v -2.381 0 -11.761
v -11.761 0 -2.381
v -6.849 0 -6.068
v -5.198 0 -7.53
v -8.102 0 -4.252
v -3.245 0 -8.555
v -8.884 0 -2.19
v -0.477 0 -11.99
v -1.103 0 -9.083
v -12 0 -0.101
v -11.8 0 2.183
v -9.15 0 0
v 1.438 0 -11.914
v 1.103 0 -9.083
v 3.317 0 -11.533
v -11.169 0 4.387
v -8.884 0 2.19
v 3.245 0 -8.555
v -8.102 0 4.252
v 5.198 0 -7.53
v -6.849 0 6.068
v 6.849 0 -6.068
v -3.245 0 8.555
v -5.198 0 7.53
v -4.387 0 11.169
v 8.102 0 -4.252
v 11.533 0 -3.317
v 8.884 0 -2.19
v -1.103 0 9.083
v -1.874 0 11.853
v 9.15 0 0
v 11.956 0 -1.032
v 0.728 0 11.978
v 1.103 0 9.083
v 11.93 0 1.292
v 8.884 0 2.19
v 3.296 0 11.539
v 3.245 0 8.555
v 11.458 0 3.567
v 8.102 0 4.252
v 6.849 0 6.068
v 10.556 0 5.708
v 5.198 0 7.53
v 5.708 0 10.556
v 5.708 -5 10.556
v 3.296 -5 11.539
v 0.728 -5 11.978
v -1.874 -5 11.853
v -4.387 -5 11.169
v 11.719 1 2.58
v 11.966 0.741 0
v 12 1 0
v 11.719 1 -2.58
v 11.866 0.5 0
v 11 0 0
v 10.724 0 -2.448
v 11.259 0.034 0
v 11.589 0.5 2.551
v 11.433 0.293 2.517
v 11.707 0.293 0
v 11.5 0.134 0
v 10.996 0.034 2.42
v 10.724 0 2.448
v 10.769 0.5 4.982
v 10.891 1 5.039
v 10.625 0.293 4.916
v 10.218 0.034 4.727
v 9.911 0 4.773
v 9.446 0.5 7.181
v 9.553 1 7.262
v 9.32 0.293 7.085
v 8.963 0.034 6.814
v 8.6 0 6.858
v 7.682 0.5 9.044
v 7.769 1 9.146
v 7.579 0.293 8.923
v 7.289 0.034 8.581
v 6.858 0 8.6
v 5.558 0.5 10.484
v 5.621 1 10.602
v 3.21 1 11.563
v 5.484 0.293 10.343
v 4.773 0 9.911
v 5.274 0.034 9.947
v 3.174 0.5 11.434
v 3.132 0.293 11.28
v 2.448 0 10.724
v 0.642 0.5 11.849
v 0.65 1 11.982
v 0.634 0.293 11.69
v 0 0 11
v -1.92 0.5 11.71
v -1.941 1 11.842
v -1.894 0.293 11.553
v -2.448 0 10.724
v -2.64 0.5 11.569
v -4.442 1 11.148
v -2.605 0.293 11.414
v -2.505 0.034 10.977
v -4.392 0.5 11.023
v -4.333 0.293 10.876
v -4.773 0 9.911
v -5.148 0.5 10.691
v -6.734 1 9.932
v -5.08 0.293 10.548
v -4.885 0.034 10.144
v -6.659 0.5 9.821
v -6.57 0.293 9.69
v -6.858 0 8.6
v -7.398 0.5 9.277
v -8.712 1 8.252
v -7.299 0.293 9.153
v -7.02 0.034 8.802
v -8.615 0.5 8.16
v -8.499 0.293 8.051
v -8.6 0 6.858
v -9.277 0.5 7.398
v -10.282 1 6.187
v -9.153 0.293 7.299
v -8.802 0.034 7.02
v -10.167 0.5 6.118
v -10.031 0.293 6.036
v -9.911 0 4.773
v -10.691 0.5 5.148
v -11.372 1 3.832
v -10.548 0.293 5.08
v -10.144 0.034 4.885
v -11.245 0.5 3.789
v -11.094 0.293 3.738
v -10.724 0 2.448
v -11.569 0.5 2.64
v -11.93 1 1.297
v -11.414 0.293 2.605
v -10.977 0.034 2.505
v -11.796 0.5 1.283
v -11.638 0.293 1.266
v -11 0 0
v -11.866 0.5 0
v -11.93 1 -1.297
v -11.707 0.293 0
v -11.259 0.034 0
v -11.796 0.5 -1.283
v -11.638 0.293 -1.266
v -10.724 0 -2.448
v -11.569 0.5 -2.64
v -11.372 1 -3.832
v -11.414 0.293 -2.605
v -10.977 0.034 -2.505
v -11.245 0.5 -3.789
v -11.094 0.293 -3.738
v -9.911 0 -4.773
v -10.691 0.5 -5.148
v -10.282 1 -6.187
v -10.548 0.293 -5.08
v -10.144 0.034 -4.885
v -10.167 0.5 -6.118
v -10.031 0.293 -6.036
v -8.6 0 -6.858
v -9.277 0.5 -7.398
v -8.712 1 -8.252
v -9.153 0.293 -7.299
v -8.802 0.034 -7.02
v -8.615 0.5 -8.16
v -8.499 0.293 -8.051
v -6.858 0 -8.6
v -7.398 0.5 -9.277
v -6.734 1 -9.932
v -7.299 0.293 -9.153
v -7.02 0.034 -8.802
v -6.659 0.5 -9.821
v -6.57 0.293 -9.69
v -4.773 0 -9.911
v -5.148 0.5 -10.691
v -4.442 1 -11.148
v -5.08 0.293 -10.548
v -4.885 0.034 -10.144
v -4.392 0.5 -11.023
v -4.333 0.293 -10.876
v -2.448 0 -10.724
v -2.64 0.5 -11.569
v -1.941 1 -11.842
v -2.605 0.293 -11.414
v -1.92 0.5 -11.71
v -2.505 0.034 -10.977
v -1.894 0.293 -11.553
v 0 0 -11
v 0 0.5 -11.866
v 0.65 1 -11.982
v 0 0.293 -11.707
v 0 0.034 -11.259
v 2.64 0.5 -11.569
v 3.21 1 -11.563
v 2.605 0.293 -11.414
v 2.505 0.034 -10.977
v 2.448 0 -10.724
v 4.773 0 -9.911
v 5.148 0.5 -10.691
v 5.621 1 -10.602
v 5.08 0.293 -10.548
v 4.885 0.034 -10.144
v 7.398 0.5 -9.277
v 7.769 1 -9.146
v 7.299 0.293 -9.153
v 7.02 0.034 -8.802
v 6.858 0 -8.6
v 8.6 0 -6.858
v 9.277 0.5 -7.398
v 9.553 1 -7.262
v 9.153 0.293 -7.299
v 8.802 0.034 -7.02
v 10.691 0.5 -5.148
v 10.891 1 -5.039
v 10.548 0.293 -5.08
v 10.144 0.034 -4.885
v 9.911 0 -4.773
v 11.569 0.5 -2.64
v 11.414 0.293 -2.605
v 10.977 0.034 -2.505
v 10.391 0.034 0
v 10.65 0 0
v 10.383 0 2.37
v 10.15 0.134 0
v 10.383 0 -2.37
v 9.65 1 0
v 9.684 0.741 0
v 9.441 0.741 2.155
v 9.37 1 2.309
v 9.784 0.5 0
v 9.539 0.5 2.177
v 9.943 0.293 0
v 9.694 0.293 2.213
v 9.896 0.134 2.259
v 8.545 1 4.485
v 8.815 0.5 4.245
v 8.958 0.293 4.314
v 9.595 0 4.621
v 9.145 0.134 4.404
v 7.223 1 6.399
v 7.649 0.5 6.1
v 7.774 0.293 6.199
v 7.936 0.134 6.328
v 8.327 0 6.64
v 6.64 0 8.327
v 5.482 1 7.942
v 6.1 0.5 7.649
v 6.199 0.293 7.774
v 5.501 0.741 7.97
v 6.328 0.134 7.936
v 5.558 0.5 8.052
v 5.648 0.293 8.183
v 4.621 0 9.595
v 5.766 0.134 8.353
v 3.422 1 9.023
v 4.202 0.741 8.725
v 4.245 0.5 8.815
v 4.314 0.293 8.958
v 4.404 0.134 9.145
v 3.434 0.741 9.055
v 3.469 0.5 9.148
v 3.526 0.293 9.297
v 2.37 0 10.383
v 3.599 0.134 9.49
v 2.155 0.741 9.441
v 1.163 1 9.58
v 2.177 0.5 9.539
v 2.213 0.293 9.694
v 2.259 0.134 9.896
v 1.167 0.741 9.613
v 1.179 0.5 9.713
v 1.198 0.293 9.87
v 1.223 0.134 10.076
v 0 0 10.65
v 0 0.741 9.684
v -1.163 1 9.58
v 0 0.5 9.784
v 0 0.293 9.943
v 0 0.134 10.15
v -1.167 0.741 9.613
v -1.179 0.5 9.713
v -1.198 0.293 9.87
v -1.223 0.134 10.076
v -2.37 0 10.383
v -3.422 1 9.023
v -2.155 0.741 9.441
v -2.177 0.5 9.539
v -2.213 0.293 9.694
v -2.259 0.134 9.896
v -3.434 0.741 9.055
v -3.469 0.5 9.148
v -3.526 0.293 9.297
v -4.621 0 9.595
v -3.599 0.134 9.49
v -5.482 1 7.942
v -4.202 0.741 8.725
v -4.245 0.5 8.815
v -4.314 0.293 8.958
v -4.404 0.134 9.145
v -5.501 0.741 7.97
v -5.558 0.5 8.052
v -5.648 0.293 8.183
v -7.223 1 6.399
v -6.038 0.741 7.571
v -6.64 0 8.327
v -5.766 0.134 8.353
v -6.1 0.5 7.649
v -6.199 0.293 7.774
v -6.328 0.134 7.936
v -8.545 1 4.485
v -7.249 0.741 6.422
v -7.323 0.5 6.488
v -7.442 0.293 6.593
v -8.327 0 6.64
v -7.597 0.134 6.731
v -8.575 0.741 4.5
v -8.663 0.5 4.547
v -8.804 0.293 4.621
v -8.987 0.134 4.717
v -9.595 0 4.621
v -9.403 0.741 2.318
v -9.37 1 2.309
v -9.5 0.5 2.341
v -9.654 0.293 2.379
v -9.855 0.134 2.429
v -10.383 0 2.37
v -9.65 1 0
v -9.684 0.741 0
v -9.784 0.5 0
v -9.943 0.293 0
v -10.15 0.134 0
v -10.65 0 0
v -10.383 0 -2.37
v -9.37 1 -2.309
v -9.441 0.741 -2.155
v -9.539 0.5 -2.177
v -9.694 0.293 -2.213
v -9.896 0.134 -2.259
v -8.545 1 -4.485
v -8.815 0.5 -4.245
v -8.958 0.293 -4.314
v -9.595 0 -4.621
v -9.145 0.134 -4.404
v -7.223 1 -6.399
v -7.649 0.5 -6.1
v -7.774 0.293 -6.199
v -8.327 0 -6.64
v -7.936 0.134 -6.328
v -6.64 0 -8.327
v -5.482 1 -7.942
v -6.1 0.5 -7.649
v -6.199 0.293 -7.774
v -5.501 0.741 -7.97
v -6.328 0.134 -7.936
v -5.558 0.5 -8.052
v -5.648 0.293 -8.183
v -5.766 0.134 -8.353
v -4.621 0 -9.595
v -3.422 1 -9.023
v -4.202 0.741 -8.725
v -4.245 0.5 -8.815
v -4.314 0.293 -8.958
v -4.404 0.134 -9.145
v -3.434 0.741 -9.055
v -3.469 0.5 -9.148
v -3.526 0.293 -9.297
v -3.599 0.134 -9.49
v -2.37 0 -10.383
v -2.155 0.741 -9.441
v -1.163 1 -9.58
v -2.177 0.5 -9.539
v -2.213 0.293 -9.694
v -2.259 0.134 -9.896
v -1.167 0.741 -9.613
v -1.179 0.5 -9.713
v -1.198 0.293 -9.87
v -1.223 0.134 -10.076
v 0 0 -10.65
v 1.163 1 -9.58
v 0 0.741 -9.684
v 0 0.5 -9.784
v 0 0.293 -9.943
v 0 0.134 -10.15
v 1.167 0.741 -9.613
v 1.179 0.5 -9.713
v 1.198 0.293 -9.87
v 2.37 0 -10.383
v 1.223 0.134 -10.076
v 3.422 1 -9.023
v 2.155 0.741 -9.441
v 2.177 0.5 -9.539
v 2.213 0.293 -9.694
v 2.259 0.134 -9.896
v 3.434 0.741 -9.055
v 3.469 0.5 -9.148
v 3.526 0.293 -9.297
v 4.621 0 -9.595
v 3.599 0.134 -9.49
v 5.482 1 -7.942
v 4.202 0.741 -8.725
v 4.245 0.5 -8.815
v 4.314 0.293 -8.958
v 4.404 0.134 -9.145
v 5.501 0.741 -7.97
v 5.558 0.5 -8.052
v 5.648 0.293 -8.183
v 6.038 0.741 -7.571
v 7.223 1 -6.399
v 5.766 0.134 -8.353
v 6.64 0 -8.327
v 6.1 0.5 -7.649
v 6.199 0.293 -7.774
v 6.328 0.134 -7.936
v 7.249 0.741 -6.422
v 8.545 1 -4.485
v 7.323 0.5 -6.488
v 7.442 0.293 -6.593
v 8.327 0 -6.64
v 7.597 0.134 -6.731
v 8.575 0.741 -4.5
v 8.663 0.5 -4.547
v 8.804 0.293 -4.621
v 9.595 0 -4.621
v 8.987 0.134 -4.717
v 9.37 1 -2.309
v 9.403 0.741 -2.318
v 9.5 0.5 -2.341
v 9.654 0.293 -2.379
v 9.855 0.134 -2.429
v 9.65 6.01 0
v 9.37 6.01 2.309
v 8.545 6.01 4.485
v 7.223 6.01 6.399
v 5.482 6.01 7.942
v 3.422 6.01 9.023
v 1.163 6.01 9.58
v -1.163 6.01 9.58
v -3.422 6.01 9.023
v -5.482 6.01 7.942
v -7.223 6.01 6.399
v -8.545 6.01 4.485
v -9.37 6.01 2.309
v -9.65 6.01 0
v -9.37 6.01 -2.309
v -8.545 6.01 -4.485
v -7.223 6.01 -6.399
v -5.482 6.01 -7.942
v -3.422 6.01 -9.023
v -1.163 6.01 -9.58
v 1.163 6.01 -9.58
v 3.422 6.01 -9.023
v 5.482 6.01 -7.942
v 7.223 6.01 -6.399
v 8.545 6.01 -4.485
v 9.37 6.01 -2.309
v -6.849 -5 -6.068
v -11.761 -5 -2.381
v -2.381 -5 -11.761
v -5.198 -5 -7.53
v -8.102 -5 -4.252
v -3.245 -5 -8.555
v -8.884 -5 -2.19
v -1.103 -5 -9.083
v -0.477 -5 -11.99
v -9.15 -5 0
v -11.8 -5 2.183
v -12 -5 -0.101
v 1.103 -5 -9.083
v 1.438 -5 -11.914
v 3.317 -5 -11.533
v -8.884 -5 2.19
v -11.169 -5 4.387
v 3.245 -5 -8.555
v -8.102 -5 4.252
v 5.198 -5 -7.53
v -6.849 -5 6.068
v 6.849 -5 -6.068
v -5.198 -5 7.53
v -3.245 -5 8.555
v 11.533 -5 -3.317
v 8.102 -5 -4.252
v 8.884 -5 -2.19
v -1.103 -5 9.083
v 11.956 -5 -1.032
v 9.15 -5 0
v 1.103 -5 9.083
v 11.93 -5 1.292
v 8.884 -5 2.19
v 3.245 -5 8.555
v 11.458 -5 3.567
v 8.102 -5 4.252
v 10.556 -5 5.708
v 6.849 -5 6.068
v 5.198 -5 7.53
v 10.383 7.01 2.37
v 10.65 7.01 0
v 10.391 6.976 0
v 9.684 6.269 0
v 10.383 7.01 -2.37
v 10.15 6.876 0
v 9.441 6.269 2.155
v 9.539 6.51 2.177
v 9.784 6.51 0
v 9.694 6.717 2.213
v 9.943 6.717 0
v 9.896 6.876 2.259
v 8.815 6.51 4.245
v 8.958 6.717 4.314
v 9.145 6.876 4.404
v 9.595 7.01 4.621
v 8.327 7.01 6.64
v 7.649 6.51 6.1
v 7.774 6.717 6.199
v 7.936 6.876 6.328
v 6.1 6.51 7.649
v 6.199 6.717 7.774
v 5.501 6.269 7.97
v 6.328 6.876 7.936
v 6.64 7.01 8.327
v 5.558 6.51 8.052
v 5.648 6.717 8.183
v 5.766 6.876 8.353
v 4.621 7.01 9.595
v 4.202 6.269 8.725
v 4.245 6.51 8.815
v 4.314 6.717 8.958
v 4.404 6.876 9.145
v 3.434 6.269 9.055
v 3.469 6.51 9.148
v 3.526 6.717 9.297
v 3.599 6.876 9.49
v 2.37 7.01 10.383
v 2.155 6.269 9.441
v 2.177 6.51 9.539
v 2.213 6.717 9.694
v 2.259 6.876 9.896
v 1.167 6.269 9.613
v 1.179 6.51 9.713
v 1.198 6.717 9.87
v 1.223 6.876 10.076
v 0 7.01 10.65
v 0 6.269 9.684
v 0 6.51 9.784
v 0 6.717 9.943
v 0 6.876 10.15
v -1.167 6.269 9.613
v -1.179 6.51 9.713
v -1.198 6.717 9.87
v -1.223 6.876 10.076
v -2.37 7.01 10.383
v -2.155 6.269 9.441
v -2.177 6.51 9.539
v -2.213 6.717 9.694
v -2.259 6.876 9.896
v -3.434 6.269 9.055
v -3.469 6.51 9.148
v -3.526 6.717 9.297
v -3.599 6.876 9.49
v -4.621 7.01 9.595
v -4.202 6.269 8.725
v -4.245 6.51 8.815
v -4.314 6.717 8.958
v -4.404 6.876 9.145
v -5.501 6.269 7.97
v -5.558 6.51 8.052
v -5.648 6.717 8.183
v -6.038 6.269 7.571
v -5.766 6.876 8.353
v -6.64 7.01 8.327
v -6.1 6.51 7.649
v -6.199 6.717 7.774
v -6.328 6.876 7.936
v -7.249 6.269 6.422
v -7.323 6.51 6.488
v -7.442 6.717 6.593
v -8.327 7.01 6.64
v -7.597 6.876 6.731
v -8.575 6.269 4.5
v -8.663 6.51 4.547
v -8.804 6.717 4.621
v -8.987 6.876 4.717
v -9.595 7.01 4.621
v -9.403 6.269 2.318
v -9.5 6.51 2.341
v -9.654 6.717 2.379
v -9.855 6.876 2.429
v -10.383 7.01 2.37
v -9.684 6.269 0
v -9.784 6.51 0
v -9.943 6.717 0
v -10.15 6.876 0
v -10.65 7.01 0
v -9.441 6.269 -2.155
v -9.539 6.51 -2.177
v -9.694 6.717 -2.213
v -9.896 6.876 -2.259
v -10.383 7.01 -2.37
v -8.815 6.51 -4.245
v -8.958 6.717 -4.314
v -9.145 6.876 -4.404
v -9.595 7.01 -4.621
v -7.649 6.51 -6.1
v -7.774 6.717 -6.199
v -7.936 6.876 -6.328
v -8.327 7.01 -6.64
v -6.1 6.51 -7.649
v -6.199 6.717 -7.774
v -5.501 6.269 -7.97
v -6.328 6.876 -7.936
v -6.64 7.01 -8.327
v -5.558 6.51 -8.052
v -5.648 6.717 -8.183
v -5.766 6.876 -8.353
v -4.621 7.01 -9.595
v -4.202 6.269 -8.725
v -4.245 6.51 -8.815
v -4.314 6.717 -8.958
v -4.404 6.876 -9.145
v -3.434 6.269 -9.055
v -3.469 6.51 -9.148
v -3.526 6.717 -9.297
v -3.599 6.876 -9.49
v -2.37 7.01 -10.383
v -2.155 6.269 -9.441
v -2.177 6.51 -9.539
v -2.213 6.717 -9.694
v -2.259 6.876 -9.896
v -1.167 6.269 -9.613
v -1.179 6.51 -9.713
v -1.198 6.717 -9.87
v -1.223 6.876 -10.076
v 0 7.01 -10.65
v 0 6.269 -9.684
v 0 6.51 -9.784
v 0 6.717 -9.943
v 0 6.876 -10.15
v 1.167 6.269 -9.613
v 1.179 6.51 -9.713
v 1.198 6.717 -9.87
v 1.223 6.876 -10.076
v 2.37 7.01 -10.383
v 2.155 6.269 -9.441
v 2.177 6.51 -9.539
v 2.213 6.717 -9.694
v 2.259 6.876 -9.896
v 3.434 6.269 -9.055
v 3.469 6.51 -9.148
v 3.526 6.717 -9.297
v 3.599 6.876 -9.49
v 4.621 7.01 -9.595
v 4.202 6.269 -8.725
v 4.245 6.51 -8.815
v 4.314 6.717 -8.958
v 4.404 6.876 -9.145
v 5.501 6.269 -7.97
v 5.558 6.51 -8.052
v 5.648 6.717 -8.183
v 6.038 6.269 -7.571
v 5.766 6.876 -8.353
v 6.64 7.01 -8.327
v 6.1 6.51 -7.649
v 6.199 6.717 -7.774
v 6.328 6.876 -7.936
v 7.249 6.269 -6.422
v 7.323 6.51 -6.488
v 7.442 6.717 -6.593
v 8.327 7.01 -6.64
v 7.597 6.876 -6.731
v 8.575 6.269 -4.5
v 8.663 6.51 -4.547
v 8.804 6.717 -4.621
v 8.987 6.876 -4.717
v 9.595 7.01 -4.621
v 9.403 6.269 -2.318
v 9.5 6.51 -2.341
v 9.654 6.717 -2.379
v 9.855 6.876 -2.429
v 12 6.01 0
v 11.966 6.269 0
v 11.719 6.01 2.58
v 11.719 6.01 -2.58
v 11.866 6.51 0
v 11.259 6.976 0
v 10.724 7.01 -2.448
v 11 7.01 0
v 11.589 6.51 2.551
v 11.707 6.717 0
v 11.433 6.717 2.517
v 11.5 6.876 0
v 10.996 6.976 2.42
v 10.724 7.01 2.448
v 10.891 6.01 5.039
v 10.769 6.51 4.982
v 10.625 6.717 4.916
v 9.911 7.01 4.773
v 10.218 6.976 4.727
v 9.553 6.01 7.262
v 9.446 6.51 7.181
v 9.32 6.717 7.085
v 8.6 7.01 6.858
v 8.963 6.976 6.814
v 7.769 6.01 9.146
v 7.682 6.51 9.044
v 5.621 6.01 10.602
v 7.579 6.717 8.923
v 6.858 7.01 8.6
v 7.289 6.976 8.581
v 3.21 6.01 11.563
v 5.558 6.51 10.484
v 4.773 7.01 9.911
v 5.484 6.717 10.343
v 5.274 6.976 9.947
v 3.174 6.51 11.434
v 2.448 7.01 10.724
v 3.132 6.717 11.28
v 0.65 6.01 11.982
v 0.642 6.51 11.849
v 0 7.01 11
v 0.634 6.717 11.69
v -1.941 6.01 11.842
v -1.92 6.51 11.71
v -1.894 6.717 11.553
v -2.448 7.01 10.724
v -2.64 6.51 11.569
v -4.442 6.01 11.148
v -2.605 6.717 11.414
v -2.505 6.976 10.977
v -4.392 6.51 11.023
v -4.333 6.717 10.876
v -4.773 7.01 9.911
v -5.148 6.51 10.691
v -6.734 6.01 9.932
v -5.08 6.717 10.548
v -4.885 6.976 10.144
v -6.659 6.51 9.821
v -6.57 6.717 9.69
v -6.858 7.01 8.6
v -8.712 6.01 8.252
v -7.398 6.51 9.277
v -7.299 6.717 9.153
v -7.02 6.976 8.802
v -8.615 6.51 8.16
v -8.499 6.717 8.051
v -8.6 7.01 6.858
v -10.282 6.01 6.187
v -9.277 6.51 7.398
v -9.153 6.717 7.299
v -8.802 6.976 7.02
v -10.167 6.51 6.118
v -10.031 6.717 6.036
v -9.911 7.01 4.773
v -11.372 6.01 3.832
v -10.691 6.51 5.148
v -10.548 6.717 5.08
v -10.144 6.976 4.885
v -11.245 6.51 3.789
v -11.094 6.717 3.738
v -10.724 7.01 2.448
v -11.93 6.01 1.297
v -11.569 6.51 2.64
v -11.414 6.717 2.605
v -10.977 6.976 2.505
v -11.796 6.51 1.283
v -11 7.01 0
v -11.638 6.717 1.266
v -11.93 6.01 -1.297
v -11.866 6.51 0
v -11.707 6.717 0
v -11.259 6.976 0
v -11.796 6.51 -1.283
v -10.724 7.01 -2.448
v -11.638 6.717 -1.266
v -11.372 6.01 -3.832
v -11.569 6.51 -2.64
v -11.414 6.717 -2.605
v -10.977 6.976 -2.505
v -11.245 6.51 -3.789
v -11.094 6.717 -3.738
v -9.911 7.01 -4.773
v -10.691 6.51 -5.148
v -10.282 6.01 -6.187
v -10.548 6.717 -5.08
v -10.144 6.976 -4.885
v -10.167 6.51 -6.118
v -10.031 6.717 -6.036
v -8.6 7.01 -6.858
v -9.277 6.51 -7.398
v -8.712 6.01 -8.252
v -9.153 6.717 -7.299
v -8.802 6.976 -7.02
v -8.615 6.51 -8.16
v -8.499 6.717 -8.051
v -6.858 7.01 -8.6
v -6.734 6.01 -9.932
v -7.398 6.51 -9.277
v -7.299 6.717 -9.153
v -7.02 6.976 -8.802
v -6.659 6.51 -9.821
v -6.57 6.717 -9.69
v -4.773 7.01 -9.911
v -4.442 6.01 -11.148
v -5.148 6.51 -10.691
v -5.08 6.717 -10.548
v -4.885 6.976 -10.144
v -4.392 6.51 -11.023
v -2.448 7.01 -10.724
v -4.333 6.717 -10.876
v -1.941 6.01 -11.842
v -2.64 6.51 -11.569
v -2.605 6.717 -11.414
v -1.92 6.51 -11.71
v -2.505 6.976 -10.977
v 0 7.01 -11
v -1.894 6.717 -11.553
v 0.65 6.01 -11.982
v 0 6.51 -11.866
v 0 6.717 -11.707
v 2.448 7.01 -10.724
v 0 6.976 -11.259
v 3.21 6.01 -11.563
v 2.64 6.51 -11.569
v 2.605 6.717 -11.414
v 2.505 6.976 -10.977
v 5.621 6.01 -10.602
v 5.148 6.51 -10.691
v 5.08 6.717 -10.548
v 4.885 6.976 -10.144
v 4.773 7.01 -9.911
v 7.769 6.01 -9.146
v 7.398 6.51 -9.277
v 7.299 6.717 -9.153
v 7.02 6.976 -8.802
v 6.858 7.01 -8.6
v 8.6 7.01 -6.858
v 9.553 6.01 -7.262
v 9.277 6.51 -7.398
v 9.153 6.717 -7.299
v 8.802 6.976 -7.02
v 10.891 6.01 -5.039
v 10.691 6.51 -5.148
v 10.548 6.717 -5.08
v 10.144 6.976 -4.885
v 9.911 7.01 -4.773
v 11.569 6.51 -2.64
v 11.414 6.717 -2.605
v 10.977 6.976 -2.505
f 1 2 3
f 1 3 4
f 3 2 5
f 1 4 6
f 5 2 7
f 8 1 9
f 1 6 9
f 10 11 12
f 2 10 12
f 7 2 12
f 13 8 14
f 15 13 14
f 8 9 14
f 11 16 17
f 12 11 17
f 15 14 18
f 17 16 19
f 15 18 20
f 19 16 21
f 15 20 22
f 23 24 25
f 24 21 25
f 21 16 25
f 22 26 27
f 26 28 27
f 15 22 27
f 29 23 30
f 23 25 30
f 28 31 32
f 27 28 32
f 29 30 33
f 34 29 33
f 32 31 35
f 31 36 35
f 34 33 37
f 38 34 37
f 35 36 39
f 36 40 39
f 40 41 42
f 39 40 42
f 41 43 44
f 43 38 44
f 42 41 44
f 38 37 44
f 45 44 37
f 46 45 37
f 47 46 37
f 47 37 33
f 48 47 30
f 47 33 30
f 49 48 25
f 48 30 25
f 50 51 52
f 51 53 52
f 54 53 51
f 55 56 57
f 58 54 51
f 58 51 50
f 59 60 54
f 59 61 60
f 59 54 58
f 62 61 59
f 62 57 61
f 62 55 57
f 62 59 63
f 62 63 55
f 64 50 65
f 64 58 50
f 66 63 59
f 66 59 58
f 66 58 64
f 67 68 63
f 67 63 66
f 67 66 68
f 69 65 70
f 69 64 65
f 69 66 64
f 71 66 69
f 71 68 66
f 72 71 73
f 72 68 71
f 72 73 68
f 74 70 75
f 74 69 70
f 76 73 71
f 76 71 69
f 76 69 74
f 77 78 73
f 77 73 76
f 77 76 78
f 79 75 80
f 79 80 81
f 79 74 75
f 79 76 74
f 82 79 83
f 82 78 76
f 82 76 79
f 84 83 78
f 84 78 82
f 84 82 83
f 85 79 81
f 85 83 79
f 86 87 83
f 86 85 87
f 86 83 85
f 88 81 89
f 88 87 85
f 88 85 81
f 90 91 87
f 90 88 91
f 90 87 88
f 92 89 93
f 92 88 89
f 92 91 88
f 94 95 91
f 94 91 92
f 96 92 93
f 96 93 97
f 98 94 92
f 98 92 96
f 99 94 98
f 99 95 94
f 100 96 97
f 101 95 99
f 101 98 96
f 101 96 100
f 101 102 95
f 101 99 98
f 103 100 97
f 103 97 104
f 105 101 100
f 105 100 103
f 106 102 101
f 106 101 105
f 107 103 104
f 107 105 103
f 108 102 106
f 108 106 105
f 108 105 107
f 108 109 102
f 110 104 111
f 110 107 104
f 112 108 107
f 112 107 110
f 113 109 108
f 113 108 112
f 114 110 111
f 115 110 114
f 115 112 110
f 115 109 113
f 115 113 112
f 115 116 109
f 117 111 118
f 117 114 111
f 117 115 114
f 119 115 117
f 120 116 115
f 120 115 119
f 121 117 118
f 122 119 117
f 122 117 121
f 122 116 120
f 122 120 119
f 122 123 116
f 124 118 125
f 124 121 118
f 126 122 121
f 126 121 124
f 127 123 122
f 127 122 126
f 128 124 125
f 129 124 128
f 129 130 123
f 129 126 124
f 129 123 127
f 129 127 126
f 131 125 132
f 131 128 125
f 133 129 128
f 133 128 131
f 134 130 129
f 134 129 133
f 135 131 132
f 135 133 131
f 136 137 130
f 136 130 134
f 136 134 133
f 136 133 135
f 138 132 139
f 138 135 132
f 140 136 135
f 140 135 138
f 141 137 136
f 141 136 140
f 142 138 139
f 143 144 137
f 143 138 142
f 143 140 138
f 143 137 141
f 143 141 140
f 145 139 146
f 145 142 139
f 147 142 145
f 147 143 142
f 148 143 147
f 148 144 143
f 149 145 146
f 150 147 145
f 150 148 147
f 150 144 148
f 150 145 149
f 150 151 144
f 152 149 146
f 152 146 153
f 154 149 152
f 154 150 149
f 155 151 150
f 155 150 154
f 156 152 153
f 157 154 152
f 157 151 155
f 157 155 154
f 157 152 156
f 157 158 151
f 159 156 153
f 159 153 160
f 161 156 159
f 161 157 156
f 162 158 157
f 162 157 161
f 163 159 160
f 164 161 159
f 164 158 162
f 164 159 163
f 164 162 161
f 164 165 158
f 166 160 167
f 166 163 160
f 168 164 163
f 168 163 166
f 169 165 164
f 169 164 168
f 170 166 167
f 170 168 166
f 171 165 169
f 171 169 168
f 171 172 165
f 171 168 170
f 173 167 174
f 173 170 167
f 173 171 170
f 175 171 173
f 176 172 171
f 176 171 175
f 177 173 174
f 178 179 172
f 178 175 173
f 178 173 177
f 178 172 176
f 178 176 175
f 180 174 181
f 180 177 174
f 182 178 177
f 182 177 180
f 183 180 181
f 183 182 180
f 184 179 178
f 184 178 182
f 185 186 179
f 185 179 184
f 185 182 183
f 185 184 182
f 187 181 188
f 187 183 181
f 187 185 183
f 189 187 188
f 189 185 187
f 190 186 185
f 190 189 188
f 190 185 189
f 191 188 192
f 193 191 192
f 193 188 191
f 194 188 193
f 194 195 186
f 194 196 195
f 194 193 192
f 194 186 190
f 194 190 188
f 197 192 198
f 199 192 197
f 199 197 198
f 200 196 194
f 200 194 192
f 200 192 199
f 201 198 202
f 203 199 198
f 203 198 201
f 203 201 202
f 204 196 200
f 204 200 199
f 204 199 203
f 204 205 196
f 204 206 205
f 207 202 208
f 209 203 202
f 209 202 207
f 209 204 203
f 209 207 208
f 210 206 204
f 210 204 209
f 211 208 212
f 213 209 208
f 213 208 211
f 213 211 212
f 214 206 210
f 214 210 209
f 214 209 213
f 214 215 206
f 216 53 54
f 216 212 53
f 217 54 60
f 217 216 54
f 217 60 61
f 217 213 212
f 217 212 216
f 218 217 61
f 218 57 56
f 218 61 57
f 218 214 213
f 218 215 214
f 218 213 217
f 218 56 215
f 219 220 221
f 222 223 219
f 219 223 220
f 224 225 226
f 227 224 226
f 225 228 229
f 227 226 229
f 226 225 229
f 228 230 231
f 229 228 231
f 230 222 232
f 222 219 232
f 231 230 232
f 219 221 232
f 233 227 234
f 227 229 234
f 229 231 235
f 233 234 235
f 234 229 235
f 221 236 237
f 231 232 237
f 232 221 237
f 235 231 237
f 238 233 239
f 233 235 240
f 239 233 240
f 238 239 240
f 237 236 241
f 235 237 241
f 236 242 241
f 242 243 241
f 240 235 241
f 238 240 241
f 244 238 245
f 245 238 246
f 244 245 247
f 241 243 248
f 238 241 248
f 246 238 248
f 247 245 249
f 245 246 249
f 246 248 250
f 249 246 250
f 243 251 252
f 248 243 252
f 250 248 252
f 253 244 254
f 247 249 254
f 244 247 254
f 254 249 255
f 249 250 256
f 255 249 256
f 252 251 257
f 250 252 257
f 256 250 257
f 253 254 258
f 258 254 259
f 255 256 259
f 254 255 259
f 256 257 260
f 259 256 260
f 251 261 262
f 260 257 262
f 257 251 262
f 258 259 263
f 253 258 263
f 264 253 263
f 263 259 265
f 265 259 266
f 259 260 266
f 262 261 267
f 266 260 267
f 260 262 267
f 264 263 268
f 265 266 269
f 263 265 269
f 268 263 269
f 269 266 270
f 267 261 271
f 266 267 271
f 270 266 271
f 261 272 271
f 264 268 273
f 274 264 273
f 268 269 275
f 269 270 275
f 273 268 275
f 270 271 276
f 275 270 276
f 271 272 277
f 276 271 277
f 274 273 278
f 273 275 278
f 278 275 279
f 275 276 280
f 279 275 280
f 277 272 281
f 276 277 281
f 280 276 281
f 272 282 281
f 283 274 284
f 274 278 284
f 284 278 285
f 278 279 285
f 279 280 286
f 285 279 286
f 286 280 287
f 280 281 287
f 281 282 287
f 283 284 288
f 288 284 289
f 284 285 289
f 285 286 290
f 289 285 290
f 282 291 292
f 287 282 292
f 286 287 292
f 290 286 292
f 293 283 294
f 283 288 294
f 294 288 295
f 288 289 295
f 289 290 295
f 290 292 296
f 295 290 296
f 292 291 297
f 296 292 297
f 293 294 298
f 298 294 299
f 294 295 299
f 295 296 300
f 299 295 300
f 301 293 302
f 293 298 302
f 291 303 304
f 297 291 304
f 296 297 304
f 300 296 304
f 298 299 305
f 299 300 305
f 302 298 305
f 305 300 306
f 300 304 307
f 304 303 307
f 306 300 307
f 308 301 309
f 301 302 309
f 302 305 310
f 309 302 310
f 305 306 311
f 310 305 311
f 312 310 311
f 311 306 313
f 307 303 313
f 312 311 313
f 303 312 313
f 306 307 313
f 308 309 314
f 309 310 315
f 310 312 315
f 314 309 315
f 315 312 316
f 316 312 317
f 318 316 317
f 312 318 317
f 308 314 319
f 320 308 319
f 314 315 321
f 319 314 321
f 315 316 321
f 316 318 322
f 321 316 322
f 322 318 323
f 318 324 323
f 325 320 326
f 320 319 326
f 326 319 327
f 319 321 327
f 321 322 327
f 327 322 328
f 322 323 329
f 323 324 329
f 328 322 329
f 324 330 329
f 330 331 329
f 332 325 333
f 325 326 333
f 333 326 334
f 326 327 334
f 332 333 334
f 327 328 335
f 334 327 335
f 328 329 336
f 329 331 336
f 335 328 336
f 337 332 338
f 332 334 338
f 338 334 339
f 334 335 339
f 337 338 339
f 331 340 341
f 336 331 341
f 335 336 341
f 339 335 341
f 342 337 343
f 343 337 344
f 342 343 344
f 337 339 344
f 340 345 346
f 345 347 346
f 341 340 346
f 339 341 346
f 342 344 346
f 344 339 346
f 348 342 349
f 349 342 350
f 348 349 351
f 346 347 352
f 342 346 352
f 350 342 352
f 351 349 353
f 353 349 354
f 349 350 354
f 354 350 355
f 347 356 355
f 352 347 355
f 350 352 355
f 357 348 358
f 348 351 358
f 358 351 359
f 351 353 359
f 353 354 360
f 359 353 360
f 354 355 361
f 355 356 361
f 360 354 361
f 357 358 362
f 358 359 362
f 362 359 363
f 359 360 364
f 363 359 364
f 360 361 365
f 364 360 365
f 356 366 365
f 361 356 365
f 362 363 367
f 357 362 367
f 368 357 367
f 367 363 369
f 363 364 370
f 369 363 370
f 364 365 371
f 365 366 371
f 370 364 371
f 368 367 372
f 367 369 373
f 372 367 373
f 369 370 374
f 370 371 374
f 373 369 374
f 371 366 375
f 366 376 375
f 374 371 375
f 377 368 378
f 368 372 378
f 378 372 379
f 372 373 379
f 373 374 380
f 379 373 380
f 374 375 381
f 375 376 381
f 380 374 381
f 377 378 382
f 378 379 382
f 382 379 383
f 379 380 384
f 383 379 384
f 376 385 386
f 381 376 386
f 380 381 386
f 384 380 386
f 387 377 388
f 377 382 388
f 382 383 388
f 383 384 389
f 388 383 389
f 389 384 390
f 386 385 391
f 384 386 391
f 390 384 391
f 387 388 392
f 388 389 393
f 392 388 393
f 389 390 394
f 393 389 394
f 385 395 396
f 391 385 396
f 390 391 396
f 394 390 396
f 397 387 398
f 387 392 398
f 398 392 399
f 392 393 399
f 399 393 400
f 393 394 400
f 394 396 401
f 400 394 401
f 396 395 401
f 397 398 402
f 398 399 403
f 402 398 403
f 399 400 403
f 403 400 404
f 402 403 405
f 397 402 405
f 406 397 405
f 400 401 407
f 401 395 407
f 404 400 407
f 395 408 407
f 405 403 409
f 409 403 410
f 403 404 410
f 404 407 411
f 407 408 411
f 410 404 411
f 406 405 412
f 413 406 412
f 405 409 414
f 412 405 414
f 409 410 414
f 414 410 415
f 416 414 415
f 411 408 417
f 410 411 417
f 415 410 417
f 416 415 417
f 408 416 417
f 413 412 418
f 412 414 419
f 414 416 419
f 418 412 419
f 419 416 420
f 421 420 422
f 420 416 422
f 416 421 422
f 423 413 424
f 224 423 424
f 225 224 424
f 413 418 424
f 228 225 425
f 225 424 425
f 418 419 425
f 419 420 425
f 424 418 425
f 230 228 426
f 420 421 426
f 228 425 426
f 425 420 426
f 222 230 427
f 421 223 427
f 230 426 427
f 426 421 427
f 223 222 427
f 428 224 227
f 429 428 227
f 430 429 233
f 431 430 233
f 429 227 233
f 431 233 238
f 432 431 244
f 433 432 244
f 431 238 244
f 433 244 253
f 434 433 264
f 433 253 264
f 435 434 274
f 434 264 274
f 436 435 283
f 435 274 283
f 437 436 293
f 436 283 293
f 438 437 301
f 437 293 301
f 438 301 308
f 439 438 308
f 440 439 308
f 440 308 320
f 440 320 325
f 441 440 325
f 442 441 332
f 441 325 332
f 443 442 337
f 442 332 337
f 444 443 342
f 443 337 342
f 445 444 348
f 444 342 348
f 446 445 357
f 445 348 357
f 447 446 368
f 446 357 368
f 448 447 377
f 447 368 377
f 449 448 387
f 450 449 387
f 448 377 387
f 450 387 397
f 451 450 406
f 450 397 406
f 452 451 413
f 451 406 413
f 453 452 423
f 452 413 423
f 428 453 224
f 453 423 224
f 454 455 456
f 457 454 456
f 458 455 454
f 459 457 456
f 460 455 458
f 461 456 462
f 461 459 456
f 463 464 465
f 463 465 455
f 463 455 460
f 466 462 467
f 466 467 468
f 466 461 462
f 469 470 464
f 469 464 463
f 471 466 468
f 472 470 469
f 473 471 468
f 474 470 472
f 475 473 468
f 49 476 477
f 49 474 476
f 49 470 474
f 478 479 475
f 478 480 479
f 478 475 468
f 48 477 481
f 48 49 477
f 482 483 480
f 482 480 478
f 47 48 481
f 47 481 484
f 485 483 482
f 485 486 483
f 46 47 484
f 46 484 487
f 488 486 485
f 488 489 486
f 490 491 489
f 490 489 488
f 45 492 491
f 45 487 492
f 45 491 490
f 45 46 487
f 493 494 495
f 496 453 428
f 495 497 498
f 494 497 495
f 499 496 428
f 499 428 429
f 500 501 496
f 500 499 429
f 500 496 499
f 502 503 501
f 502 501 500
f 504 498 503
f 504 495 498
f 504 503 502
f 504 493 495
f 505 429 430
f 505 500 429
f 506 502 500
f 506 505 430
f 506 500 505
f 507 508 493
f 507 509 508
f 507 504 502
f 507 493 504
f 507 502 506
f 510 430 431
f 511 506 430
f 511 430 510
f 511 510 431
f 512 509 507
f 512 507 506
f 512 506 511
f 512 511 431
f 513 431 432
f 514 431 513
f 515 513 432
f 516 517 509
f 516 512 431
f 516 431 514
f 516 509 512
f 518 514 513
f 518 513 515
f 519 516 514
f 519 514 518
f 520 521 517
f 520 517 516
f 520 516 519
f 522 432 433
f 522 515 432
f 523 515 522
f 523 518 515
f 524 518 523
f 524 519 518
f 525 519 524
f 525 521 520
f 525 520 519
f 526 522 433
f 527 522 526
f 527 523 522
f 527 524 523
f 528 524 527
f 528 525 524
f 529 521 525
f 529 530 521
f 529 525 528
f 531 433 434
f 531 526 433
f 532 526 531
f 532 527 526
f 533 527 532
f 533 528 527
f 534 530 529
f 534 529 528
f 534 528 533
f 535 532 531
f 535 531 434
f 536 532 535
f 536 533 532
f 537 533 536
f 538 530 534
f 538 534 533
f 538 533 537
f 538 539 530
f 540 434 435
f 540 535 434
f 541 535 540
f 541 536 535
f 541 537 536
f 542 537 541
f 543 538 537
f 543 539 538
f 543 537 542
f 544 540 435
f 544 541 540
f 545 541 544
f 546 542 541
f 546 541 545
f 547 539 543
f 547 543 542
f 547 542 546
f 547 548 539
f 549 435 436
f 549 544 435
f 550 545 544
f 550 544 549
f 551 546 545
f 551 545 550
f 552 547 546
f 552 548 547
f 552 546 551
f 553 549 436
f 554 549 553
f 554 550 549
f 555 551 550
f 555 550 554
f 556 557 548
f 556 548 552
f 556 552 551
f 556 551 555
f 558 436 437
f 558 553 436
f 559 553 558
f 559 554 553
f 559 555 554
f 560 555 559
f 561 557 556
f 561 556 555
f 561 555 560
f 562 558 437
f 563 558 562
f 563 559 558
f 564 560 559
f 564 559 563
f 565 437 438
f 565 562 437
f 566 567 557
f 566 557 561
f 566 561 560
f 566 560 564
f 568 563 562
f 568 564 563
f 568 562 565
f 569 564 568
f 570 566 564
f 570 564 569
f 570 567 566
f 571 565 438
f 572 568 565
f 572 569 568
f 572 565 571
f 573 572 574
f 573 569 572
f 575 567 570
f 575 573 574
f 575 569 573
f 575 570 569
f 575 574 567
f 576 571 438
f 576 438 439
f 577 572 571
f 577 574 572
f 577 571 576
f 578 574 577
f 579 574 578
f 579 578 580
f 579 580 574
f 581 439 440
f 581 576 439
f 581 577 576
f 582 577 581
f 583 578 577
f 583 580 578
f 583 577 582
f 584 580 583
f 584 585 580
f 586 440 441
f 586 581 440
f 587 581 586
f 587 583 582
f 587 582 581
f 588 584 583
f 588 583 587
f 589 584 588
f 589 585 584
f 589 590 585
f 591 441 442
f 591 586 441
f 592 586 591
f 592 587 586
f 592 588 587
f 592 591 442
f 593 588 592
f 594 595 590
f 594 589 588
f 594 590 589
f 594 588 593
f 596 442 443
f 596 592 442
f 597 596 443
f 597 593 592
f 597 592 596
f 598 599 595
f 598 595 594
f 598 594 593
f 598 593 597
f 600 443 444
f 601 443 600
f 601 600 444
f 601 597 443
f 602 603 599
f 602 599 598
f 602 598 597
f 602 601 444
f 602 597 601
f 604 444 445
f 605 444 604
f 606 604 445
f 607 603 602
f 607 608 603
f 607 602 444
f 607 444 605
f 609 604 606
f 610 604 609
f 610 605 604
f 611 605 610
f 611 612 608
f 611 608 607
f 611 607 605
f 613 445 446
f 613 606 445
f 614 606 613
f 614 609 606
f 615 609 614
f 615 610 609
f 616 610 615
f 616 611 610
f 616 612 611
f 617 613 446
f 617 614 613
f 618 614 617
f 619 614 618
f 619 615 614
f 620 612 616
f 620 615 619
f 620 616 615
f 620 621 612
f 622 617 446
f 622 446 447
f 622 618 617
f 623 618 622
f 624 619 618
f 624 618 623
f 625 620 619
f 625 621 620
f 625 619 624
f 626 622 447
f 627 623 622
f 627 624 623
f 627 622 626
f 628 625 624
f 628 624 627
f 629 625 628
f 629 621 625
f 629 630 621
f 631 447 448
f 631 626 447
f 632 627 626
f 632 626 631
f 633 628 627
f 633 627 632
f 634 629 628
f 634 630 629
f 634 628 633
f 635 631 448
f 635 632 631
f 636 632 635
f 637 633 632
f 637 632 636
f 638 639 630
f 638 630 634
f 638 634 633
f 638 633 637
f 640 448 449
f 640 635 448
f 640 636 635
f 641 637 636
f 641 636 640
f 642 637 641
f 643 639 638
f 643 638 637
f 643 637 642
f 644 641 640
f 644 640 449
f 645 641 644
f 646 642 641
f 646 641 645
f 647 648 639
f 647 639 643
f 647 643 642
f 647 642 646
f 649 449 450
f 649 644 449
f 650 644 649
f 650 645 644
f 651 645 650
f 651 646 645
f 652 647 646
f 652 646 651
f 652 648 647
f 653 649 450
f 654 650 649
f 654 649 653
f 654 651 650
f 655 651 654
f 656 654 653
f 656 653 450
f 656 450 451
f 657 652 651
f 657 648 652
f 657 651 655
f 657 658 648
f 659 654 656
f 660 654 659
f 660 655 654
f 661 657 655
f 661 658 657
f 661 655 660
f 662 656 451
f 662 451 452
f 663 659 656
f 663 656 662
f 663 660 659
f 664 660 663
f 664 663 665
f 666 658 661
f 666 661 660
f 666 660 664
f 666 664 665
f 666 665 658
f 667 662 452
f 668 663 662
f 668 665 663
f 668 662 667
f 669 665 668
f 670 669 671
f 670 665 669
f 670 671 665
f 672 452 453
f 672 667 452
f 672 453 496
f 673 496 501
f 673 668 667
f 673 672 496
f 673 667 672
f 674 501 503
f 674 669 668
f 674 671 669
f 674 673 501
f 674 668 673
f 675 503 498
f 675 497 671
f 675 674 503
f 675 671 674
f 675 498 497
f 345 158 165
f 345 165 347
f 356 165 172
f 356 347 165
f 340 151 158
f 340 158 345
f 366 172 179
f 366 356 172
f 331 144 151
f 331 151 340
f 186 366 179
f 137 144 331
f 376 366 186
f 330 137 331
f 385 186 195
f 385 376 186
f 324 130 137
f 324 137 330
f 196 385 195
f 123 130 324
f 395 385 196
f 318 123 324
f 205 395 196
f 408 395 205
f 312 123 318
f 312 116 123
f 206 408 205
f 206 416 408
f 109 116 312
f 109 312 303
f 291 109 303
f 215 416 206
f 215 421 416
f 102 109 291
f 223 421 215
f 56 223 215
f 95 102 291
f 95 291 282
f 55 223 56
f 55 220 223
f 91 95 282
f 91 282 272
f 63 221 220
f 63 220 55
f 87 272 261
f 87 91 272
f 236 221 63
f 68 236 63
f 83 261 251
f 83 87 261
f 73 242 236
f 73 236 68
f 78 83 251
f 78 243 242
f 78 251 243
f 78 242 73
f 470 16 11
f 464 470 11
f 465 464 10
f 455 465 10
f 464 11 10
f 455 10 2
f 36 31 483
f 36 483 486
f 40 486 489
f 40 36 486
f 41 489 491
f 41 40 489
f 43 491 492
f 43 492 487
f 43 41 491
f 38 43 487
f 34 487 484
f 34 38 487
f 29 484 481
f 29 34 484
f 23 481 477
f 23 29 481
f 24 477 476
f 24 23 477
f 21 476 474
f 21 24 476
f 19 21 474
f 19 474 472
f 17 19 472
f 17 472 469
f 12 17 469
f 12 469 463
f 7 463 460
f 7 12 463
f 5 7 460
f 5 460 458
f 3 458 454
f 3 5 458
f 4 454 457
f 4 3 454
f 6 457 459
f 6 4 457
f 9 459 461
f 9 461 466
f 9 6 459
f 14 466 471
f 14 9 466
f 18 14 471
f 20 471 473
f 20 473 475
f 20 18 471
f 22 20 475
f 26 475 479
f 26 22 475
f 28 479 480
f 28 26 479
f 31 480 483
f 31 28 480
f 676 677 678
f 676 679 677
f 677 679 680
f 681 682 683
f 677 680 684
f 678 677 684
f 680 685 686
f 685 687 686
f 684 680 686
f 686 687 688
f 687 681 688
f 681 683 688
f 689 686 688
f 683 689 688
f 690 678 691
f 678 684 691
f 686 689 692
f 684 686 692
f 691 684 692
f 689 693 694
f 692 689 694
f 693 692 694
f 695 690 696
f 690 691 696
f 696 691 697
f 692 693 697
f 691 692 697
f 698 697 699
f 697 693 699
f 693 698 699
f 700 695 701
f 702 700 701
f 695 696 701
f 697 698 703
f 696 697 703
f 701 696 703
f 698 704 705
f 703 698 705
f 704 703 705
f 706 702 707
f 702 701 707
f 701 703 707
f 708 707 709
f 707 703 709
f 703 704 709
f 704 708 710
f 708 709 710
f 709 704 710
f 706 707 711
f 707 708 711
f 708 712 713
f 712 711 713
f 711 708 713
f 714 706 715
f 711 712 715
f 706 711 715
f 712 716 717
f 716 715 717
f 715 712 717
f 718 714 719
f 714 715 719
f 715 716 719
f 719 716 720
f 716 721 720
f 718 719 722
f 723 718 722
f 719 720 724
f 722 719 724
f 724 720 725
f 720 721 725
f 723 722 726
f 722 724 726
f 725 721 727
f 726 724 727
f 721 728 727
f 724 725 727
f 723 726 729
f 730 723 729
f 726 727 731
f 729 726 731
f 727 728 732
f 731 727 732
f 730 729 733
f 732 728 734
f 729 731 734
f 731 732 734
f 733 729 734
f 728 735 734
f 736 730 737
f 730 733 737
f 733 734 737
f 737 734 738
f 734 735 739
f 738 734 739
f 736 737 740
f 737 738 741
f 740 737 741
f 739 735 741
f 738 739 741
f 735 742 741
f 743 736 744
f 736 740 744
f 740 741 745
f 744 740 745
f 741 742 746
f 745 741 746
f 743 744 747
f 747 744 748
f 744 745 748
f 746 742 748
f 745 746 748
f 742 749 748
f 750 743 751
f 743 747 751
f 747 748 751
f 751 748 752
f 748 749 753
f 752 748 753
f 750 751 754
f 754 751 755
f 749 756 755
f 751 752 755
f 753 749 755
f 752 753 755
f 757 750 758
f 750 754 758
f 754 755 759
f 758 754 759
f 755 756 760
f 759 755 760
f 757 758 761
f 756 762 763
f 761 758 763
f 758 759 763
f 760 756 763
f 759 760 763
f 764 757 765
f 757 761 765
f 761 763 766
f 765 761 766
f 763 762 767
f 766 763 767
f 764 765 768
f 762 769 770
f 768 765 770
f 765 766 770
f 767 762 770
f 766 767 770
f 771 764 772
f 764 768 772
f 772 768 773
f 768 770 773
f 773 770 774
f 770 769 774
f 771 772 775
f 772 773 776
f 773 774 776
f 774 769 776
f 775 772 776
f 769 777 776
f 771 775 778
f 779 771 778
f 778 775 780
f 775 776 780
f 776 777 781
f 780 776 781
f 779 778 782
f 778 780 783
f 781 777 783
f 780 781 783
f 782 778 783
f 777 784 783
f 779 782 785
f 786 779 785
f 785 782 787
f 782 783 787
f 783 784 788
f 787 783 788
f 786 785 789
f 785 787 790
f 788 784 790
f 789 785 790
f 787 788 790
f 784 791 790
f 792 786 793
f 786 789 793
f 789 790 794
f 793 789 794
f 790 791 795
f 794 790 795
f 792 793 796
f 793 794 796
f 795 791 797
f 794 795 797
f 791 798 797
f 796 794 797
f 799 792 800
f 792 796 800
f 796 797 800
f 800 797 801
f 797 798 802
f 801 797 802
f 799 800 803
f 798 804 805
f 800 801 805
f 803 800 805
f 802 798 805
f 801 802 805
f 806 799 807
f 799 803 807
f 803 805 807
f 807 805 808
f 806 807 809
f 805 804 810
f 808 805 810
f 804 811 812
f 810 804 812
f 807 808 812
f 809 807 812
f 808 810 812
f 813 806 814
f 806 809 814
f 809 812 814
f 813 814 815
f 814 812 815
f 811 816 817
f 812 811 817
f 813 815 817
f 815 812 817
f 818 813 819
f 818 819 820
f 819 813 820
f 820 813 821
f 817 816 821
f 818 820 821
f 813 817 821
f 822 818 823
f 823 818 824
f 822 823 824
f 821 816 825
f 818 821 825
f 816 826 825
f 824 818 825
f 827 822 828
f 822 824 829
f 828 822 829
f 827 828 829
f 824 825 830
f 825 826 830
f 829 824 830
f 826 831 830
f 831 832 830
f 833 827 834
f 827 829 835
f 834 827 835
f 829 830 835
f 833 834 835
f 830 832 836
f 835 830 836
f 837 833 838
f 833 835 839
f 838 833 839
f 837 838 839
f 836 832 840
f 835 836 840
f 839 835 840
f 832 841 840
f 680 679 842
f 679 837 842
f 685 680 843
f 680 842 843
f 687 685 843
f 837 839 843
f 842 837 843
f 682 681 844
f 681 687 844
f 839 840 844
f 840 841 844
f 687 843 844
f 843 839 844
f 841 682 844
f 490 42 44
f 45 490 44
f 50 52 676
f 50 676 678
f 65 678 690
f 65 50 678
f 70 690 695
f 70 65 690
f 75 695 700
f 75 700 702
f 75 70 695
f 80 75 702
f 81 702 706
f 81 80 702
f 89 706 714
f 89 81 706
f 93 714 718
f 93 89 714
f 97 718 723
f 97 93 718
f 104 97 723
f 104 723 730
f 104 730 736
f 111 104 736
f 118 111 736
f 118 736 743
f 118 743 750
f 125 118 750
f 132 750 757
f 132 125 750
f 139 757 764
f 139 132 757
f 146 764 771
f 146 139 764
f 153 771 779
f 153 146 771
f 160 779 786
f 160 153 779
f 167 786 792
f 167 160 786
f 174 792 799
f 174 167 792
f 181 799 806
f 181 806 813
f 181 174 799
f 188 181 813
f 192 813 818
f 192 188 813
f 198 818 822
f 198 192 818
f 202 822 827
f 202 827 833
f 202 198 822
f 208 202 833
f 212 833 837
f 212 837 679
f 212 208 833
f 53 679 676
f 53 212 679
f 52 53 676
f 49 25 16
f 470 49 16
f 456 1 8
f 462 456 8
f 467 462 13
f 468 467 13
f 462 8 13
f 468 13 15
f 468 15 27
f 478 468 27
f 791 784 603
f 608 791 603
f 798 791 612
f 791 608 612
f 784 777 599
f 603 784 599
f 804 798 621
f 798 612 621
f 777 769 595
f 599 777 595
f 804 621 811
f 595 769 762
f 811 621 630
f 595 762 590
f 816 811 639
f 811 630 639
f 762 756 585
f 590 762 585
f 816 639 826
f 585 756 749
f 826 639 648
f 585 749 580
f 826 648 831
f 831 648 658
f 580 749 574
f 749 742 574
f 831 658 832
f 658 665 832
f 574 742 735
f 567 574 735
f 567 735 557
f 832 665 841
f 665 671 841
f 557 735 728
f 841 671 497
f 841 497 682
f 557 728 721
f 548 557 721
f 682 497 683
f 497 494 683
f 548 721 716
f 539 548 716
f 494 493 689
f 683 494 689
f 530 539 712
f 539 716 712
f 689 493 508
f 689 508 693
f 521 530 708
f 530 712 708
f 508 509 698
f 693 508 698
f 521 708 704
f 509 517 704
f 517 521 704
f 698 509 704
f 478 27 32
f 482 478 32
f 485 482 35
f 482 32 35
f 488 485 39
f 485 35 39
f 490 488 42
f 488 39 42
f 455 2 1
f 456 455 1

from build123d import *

# Parameters (mm, degrees)
F0_R     = 12
F0_R_2   = 9.65
F1_DEPTH = 7.01
F2_R     = 1
F3_R     = 9.65
F3_R_2   = 9.15
F4_DEPTH = 5


with BuildPart() as f1:
    # F0 (on Front) → F1 (new body)
    with BuildSketch(Plane.XZ):
        Circle(F0_R)
        Circle(F0_R_2, mode=Mode.SUBTRACT)
    extrude(amount=-F1_DEPTH)

    # F2
    f2_edges = [f1.edges().sort_by_distance(p)[0] for p in [
        (-12, 0, 0),
        (-12, 7.01, 0),
        (-9.65, 0, 0),
        (-9.65, 7.01, 0),
    ]]
    fillet(f2_edges, radius=F2_R)


with BuildPart() as f4:
    # F3 (on face) → F4 (new body)
    with BuildSketch(Plane.XZ):
        with BuildLine():
            Line((-4.38701, 11.16934), (-11.16934, 4.38701))
            ThreePointArc((-11.16934, 4.38701), (-11.954329, 1.045957), (-11.761484, -2.380652))
            Line((-11.761484, -2.380652), (-2.380652, -11.761484))
            ThreePointArc((-2.380652, -11.761484), (0.481821, -11.990323), (3.316702, -11.53254))
            Line((3.316702, -11.53254), (11.53254, -3.316702))
            ThreePointArc((11.53254, -3.316702), (11.930295, 1.291535), (10.555568, 5.707888))
            Line((10.555568, 5.707888), (5.707888, 10.555568))
            ThreePointArc((5.707888, 10.555568), (0.728257, 11.977881), (-4.38701, 11.16934))
        make_face()
        Circle(F3_R, mode=Mode.SUBTRACT)
        Circle(F3_R)
        Circle(F3_R_2, mode=Mode.SUBTRACT)
    extrude(amount=F4_DEPTH)


solid = Compound([f1.part, f4.part])
